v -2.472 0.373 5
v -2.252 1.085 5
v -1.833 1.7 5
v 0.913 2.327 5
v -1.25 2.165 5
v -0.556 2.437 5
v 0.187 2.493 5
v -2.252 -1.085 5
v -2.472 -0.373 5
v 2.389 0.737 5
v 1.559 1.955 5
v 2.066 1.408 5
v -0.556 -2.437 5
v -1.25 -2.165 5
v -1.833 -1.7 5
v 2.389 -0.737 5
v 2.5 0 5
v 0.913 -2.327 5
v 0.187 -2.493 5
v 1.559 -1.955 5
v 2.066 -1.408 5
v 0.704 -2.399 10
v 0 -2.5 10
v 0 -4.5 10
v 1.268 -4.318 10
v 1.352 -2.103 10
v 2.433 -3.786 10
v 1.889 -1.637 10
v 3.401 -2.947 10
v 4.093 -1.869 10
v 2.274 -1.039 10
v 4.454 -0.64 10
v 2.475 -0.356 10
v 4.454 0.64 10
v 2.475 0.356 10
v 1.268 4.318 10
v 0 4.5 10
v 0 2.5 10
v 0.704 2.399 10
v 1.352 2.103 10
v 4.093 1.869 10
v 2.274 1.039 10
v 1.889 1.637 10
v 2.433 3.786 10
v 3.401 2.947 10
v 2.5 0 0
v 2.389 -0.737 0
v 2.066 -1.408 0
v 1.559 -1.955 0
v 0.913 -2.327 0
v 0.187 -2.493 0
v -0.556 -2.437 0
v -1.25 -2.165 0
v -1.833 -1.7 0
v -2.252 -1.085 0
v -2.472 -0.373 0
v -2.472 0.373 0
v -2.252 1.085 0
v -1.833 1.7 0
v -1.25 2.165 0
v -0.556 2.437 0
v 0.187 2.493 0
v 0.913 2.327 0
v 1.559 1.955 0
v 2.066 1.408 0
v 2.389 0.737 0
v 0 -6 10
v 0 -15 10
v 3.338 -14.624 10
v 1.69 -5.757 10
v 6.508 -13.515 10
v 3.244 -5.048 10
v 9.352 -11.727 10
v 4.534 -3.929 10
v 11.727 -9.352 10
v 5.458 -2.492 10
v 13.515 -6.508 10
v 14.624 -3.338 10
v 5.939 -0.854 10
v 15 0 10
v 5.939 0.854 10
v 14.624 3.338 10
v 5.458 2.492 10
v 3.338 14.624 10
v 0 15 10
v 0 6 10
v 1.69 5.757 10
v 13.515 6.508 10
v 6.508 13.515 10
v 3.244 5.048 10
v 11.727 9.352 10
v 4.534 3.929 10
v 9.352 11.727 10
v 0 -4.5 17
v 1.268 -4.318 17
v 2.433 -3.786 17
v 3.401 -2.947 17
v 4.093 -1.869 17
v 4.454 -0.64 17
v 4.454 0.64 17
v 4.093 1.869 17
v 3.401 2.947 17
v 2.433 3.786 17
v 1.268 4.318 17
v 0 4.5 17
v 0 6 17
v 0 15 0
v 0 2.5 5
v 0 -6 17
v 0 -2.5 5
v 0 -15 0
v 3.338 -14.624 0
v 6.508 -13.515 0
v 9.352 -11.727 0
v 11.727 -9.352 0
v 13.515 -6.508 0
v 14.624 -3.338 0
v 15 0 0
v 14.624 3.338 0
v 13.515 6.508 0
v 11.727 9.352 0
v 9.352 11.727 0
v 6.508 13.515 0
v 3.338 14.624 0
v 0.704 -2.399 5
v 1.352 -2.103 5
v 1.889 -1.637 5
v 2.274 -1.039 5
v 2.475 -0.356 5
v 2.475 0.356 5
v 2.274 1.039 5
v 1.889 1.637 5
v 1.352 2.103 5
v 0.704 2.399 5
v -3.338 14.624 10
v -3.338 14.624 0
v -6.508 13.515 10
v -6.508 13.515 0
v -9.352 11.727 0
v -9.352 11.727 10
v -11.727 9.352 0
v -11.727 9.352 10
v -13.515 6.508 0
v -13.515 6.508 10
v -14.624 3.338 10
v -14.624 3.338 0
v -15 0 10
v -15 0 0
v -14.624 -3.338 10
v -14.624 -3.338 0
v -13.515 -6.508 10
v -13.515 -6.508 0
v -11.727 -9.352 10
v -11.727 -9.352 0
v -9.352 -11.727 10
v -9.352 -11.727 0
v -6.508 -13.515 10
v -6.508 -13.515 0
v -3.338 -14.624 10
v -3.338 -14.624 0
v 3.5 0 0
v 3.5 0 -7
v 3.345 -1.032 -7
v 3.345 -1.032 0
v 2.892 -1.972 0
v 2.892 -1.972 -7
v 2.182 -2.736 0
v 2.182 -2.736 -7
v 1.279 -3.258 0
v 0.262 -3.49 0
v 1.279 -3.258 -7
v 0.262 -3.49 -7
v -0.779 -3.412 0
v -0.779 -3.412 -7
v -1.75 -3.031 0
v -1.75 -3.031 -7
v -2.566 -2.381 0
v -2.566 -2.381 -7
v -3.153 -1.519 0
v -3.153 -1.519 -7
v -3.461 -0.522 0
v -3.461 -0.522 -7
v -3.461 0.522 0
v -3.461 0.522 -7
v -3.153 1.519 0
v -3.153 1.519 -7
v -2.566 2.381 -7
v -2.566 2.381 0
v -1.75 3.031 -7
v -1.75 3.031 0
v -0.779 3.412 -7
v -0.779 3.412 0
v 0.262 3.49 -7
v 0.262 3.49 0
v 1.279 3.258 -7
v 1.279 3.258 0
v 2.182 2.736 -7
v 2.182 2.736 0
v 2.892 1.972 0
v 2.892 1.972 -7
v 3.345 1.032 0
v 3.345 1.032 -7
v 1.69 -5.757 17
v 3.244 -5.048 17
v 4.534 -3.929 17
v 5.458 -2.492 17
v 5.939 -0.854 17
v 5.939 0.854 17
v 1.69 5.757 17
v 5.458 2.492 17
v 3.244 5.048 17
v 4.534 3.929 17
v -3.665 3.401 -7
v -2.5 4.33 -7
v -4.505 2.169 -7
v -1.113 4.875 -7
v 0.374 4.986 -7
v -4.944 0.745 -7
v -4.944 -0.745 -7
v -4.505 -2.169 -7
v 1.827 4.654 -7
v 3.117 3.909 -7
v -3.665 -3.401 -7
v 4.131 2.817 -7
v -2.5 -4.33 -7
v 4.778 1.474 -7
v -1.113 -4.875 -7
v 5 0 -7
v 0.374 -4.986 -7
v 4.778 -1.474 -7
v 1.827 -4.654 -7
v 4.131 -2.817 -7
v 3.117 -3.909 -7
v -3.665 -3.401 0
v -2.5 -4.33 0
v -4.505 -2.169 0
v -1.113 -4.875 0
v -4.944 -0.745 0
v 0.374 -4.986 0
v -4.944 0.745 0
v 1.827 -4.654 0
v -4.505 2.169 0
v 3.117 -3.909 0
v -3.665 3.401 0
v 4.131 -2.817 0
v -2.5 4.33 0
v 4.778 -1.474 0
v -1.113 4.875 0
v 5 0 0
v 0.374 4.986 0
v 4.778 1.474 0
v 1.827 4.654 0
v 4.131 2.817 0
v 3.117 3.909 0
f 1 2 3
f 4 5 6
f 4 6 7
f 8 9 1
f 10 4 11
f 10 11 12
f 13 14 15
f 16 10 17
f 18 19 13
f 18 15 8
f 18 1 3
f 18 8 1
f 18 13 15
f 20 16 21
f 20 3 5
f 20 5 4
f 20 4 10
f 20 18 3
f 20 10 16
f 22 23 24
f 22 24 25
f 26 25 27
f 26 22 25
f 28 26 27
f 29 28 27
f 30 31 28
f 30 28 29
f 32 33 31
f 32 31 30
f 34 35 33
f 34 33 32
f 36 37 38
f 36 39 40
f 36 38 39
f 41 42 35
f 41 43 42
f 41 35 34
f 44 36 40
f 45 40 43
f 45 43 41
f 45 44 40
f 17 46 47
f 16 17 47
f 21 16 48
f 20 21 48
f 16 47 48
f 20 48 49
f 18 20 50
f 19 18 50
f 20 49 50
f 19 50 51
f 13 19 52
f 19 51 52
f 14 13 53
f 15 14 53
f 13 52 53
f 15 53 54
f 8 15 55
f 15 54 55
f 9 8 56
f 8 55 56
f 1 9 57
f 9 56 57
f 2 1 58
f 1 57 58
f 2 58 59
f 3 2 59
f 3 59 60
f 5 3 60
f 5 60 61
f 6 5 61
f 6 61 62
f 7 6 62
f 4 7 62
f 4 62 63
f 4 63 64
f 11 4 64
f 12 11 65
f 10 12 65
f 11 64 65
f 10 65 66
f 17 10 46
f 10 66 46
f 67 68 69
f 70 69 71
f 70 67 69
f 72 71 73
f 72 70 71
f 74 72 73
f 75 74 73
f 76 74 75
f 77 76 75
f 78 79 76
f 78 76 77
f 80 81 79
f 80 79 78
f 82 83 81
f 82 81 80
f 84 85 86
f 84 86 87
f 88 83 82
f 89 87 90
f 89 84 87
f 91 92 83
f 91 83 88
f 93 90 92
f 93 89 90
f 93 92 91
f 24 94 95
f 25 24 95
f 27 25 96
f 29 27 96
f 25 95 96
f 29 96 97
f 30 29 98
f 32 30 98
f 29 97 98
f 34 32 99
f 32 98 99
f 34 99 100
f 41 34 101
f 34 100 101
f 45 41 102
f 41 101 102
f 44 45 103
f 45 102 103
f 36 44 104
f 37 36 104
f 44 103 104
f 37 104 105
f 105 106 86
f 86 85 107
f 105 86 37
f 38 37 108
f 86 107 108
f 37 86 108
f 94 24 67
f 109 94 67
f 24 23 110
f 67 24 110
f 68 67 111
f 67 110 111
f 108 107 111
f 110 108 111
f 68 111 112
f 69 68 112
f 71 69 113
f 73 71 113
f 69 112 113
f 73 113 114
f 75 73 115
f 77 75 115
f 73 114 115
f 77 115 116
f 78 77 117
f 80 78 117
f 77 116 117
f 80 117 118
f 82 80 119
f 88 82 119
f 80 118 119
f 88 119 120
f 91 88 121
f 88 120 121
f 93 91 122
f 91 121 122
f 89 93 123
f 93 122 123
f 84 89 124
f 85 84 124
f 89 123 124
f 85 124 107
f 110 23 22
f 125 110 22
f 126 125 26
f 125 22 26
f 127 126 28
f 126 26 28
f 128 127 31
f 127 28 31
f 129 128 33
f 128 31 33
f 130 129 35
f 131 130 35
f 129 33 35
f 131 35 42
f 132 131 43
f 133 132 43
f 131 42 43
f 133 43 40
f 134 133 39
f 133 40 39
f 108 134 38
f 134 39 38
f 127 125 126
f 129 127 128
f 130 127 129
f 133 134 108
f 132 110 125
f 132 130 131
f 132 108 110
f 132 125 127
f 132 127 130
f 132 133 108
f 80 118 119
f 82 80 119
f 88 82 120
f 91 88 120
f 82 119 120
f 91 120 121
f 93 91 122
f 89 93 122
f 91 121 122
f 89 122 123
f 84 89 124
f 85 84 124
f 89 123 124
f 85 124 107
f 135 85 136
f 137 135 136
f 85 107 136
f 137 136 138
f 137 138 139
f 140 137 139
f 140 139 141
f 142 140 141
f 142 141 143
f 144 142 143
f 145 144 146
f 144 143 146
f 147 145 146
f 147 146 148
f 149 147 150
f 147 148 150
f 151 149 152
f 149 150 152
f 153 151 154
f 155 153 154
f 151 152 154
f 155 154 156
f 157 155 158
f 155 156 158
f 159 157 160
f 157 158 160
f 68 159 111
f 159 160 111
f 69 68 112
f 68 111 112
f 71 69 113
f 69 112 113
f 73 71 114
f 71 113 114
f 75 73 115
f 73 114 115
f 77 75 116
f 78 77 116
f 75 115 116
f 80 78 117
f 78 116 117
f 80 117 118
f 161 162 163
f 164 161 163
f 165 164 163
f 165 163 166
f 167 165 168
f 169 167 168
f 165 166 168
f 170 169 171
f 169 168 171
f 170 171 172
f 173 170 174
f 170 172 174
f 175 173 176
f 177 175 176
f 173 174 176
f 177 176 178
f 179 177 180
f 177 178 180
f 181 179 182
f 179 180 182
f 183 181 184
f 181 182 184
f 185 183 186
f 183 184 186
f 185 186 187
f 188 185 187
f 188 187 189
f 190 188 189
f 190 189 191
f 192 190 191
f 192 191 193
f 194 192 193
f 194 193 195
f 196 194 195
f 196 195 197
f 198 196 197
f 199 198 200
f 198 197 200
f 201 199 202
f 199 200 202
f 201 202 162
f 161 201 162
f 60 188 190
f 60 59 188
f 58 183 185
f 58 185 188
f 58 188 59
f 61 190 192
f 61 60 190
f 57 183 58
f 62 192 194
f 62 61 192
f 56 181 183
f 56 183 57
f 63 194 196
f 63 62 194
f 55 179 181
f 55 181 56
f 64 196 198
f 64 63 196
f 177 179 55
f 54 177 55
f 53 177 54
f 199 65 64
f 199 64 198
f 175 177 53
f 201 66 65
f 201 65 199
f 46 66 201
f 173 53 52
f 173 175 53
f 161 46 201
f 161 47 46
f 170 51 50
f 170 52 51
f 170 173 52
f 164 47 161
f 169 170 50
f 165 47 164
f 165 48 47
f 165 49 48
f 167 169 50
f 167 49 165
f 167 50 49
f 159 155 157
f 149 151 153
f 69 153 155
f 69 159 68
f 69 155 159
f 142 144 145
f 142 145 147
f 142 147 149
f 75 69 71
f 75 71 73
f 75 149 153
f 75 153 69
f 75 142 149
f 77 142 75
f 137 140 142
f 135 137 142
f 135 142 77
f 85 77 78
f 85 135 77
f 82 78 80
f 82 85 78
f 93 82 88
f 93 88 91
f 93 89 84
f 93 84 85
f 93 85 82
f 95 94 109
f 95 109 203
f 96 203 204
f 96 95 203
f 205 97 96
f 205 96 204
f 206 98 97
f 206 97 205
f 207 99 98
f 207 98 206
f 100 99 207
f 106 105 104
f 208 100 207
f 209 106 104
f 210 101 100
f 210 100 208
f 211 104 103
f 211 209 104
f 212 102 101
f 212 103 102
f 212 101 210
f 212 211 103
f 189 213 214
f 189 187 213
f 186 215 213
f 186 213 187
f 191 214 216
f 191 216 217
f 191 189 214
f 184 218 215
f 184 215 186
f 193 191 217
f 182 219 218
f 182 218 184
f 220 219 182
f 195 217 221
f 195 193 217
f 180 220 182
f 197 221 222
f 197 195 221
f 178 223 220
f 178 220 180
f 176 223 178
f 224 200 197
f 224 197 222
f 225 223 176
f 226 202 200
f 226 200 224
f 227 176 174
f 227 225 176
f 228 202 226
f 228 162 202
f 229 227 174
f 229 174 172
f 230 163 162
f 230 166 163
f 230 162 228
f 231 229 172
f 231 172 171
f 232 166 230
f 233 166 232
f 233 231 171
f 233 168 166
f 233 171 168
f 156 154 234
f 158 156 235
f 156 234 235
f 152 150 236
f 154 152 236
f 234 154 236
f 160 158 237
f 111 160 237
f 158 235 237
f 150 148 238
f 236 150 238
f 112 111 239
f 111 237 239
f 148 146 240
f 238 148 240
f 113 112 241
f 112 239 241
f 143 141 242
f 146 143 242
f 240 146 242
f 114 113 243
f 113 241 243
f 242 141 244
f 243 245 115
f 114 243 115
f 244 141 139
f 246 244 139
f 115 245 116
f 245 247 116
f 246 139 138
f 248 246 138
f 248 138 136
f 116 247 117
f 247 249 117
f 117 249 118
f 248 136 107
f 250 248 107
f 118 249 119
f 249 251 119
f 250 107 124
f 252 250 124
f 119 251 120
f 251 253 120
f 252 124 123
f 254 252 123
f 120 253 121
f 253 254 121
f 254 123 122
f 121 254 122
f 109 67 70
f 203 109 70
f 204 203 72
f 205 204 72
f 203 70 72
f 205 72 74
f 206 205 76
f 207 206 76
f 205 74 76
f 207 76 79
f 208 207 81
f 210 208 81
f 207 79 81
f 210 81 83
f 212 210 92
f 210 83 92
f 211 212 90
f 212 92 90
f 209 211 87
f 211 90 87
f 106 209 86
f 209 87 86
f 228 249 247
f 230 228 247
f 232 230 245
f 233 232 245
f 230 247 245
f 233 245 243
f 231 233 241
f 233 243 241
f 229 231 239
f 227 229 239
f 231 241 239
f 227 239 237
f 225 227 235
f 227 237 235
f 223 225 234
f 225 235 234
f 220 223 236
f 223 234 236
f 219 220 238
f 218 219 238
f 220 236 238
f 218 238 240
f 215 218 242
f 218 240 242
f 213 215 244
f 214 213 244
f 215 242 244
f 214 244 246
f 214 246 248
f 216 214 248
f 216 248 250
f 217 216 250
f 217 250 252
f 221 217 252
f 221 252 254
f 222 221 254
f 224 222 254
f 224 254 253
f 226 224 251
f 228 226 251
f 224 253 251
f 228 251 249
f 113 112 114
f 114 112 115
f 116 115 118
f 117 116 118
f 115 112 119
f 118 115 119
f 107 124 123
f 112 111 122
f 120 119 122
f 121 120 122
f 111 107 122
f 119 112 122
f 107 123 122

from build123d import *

# Parameters (mm, degrees)
SKETCH_R        = 15
PAD_DEPTH       = 10
SKETCH001_R     = 2.5
POCKET_DEPTH    = 5
SKETCH002_R     = 5
PAD001_DEPTH    = 7
SKETCH003_R     = 3.5
POCKET001_DEPTH = 7
PAD002_DEPTH    = 10
PAD003_DEPTH    = 7
POCKET002_DEPTH = 12
POCKET003_DEPTH = 7


with BuildPart() as body:
    # Sketch → Pad (new body)
    with BuildSketch(Plane.XY):
        Circle(SKETCH_R)
    extrude(amount=PAD_DEPTH)

    # Sketch001 (on Face2 of Pad) → Pocket (cut)
    with BuildSketch(Plane(origin=(0, 0, 0), x_dir=(1, 0, 0), z_dir=(0, 0, -1))):
        Circle(SKETCH001_R)
    extrude(amount=-POCKET_DEPTH, mode=Mode.SUBTRACT)

    # Sketch002 (on Face2 of Pocket) → Pad001 (join)
    with BuildSketch(Plane(origin=(0, 0, 0), x_dir=(1, 0, 0), z_dir=(0, 0, -1))):
        Circle(SKETCH002_R)
    extrude(amount=PAD001_DEPTH)

    # Sketch003 (on Face5 of Pad001) → Pocket001 (cut)
    with BuildSketch(Plane(origin=(0, 0, -7), x_dir=(1, 0, 0), z_dir=(0, 0, -1))):
        Circle(SKETCH003_R)
    extrude(amount=-POCKET001_DEPTH, mode=Mode.SUBTRACT)


with BuildPart() as bodyhalf:
    # Sketch004 → Pad002 (new body)
    with BuildSketch(Plane.XY):
        with BuildLine():
            ThreePointArc((0, -15), (15, 0), (0, 15))
            Line((0, 15), (0, -15))
        make_face()
    extrude(amount=PAD002_DEPTH)

    # Sketch006 → Pad003 (join)
    with BuildSketch(Plane.XY.offset(10)):
        with BuildLine():
            ThreePointArc((0, -6), (6, 0), (0, 6))
            Line((0, 6), (0, -6))
        make_face()
    extrude(amount=PAD003_DEPTH)

    # Sketch007 (on Face7 of Pad003) → Pocket002 (cut)
    with BuildSketch(Plane.XY.offset(17)):
        with BuildLine():
            ThreePointArc((0, -2.5), (2.5, 0), (0, 2.5))
            Line((0, 2.5), (0, -2.5))
        make_face()
    extrude(amount=-POCKET002_DEPTH, mode=Mode.SUBTRACT)

    # Sketch008 (on Face10 of Pocket002) → Pocket003 (cut)
    with BuildSketch(Plane.XY.offset(17)):
        with BuildLine():
            ThreePointArc((0, -4.5), (4.5, 0), (0, 4.5))
            Line((0, 4.5), (0, -4.5))
        make_face()
    extrude(amount=-POCKET003_DEPTH, mode=Mode.SUBTRACT)


solid = Compound([body.part, bodyhalf.part])
